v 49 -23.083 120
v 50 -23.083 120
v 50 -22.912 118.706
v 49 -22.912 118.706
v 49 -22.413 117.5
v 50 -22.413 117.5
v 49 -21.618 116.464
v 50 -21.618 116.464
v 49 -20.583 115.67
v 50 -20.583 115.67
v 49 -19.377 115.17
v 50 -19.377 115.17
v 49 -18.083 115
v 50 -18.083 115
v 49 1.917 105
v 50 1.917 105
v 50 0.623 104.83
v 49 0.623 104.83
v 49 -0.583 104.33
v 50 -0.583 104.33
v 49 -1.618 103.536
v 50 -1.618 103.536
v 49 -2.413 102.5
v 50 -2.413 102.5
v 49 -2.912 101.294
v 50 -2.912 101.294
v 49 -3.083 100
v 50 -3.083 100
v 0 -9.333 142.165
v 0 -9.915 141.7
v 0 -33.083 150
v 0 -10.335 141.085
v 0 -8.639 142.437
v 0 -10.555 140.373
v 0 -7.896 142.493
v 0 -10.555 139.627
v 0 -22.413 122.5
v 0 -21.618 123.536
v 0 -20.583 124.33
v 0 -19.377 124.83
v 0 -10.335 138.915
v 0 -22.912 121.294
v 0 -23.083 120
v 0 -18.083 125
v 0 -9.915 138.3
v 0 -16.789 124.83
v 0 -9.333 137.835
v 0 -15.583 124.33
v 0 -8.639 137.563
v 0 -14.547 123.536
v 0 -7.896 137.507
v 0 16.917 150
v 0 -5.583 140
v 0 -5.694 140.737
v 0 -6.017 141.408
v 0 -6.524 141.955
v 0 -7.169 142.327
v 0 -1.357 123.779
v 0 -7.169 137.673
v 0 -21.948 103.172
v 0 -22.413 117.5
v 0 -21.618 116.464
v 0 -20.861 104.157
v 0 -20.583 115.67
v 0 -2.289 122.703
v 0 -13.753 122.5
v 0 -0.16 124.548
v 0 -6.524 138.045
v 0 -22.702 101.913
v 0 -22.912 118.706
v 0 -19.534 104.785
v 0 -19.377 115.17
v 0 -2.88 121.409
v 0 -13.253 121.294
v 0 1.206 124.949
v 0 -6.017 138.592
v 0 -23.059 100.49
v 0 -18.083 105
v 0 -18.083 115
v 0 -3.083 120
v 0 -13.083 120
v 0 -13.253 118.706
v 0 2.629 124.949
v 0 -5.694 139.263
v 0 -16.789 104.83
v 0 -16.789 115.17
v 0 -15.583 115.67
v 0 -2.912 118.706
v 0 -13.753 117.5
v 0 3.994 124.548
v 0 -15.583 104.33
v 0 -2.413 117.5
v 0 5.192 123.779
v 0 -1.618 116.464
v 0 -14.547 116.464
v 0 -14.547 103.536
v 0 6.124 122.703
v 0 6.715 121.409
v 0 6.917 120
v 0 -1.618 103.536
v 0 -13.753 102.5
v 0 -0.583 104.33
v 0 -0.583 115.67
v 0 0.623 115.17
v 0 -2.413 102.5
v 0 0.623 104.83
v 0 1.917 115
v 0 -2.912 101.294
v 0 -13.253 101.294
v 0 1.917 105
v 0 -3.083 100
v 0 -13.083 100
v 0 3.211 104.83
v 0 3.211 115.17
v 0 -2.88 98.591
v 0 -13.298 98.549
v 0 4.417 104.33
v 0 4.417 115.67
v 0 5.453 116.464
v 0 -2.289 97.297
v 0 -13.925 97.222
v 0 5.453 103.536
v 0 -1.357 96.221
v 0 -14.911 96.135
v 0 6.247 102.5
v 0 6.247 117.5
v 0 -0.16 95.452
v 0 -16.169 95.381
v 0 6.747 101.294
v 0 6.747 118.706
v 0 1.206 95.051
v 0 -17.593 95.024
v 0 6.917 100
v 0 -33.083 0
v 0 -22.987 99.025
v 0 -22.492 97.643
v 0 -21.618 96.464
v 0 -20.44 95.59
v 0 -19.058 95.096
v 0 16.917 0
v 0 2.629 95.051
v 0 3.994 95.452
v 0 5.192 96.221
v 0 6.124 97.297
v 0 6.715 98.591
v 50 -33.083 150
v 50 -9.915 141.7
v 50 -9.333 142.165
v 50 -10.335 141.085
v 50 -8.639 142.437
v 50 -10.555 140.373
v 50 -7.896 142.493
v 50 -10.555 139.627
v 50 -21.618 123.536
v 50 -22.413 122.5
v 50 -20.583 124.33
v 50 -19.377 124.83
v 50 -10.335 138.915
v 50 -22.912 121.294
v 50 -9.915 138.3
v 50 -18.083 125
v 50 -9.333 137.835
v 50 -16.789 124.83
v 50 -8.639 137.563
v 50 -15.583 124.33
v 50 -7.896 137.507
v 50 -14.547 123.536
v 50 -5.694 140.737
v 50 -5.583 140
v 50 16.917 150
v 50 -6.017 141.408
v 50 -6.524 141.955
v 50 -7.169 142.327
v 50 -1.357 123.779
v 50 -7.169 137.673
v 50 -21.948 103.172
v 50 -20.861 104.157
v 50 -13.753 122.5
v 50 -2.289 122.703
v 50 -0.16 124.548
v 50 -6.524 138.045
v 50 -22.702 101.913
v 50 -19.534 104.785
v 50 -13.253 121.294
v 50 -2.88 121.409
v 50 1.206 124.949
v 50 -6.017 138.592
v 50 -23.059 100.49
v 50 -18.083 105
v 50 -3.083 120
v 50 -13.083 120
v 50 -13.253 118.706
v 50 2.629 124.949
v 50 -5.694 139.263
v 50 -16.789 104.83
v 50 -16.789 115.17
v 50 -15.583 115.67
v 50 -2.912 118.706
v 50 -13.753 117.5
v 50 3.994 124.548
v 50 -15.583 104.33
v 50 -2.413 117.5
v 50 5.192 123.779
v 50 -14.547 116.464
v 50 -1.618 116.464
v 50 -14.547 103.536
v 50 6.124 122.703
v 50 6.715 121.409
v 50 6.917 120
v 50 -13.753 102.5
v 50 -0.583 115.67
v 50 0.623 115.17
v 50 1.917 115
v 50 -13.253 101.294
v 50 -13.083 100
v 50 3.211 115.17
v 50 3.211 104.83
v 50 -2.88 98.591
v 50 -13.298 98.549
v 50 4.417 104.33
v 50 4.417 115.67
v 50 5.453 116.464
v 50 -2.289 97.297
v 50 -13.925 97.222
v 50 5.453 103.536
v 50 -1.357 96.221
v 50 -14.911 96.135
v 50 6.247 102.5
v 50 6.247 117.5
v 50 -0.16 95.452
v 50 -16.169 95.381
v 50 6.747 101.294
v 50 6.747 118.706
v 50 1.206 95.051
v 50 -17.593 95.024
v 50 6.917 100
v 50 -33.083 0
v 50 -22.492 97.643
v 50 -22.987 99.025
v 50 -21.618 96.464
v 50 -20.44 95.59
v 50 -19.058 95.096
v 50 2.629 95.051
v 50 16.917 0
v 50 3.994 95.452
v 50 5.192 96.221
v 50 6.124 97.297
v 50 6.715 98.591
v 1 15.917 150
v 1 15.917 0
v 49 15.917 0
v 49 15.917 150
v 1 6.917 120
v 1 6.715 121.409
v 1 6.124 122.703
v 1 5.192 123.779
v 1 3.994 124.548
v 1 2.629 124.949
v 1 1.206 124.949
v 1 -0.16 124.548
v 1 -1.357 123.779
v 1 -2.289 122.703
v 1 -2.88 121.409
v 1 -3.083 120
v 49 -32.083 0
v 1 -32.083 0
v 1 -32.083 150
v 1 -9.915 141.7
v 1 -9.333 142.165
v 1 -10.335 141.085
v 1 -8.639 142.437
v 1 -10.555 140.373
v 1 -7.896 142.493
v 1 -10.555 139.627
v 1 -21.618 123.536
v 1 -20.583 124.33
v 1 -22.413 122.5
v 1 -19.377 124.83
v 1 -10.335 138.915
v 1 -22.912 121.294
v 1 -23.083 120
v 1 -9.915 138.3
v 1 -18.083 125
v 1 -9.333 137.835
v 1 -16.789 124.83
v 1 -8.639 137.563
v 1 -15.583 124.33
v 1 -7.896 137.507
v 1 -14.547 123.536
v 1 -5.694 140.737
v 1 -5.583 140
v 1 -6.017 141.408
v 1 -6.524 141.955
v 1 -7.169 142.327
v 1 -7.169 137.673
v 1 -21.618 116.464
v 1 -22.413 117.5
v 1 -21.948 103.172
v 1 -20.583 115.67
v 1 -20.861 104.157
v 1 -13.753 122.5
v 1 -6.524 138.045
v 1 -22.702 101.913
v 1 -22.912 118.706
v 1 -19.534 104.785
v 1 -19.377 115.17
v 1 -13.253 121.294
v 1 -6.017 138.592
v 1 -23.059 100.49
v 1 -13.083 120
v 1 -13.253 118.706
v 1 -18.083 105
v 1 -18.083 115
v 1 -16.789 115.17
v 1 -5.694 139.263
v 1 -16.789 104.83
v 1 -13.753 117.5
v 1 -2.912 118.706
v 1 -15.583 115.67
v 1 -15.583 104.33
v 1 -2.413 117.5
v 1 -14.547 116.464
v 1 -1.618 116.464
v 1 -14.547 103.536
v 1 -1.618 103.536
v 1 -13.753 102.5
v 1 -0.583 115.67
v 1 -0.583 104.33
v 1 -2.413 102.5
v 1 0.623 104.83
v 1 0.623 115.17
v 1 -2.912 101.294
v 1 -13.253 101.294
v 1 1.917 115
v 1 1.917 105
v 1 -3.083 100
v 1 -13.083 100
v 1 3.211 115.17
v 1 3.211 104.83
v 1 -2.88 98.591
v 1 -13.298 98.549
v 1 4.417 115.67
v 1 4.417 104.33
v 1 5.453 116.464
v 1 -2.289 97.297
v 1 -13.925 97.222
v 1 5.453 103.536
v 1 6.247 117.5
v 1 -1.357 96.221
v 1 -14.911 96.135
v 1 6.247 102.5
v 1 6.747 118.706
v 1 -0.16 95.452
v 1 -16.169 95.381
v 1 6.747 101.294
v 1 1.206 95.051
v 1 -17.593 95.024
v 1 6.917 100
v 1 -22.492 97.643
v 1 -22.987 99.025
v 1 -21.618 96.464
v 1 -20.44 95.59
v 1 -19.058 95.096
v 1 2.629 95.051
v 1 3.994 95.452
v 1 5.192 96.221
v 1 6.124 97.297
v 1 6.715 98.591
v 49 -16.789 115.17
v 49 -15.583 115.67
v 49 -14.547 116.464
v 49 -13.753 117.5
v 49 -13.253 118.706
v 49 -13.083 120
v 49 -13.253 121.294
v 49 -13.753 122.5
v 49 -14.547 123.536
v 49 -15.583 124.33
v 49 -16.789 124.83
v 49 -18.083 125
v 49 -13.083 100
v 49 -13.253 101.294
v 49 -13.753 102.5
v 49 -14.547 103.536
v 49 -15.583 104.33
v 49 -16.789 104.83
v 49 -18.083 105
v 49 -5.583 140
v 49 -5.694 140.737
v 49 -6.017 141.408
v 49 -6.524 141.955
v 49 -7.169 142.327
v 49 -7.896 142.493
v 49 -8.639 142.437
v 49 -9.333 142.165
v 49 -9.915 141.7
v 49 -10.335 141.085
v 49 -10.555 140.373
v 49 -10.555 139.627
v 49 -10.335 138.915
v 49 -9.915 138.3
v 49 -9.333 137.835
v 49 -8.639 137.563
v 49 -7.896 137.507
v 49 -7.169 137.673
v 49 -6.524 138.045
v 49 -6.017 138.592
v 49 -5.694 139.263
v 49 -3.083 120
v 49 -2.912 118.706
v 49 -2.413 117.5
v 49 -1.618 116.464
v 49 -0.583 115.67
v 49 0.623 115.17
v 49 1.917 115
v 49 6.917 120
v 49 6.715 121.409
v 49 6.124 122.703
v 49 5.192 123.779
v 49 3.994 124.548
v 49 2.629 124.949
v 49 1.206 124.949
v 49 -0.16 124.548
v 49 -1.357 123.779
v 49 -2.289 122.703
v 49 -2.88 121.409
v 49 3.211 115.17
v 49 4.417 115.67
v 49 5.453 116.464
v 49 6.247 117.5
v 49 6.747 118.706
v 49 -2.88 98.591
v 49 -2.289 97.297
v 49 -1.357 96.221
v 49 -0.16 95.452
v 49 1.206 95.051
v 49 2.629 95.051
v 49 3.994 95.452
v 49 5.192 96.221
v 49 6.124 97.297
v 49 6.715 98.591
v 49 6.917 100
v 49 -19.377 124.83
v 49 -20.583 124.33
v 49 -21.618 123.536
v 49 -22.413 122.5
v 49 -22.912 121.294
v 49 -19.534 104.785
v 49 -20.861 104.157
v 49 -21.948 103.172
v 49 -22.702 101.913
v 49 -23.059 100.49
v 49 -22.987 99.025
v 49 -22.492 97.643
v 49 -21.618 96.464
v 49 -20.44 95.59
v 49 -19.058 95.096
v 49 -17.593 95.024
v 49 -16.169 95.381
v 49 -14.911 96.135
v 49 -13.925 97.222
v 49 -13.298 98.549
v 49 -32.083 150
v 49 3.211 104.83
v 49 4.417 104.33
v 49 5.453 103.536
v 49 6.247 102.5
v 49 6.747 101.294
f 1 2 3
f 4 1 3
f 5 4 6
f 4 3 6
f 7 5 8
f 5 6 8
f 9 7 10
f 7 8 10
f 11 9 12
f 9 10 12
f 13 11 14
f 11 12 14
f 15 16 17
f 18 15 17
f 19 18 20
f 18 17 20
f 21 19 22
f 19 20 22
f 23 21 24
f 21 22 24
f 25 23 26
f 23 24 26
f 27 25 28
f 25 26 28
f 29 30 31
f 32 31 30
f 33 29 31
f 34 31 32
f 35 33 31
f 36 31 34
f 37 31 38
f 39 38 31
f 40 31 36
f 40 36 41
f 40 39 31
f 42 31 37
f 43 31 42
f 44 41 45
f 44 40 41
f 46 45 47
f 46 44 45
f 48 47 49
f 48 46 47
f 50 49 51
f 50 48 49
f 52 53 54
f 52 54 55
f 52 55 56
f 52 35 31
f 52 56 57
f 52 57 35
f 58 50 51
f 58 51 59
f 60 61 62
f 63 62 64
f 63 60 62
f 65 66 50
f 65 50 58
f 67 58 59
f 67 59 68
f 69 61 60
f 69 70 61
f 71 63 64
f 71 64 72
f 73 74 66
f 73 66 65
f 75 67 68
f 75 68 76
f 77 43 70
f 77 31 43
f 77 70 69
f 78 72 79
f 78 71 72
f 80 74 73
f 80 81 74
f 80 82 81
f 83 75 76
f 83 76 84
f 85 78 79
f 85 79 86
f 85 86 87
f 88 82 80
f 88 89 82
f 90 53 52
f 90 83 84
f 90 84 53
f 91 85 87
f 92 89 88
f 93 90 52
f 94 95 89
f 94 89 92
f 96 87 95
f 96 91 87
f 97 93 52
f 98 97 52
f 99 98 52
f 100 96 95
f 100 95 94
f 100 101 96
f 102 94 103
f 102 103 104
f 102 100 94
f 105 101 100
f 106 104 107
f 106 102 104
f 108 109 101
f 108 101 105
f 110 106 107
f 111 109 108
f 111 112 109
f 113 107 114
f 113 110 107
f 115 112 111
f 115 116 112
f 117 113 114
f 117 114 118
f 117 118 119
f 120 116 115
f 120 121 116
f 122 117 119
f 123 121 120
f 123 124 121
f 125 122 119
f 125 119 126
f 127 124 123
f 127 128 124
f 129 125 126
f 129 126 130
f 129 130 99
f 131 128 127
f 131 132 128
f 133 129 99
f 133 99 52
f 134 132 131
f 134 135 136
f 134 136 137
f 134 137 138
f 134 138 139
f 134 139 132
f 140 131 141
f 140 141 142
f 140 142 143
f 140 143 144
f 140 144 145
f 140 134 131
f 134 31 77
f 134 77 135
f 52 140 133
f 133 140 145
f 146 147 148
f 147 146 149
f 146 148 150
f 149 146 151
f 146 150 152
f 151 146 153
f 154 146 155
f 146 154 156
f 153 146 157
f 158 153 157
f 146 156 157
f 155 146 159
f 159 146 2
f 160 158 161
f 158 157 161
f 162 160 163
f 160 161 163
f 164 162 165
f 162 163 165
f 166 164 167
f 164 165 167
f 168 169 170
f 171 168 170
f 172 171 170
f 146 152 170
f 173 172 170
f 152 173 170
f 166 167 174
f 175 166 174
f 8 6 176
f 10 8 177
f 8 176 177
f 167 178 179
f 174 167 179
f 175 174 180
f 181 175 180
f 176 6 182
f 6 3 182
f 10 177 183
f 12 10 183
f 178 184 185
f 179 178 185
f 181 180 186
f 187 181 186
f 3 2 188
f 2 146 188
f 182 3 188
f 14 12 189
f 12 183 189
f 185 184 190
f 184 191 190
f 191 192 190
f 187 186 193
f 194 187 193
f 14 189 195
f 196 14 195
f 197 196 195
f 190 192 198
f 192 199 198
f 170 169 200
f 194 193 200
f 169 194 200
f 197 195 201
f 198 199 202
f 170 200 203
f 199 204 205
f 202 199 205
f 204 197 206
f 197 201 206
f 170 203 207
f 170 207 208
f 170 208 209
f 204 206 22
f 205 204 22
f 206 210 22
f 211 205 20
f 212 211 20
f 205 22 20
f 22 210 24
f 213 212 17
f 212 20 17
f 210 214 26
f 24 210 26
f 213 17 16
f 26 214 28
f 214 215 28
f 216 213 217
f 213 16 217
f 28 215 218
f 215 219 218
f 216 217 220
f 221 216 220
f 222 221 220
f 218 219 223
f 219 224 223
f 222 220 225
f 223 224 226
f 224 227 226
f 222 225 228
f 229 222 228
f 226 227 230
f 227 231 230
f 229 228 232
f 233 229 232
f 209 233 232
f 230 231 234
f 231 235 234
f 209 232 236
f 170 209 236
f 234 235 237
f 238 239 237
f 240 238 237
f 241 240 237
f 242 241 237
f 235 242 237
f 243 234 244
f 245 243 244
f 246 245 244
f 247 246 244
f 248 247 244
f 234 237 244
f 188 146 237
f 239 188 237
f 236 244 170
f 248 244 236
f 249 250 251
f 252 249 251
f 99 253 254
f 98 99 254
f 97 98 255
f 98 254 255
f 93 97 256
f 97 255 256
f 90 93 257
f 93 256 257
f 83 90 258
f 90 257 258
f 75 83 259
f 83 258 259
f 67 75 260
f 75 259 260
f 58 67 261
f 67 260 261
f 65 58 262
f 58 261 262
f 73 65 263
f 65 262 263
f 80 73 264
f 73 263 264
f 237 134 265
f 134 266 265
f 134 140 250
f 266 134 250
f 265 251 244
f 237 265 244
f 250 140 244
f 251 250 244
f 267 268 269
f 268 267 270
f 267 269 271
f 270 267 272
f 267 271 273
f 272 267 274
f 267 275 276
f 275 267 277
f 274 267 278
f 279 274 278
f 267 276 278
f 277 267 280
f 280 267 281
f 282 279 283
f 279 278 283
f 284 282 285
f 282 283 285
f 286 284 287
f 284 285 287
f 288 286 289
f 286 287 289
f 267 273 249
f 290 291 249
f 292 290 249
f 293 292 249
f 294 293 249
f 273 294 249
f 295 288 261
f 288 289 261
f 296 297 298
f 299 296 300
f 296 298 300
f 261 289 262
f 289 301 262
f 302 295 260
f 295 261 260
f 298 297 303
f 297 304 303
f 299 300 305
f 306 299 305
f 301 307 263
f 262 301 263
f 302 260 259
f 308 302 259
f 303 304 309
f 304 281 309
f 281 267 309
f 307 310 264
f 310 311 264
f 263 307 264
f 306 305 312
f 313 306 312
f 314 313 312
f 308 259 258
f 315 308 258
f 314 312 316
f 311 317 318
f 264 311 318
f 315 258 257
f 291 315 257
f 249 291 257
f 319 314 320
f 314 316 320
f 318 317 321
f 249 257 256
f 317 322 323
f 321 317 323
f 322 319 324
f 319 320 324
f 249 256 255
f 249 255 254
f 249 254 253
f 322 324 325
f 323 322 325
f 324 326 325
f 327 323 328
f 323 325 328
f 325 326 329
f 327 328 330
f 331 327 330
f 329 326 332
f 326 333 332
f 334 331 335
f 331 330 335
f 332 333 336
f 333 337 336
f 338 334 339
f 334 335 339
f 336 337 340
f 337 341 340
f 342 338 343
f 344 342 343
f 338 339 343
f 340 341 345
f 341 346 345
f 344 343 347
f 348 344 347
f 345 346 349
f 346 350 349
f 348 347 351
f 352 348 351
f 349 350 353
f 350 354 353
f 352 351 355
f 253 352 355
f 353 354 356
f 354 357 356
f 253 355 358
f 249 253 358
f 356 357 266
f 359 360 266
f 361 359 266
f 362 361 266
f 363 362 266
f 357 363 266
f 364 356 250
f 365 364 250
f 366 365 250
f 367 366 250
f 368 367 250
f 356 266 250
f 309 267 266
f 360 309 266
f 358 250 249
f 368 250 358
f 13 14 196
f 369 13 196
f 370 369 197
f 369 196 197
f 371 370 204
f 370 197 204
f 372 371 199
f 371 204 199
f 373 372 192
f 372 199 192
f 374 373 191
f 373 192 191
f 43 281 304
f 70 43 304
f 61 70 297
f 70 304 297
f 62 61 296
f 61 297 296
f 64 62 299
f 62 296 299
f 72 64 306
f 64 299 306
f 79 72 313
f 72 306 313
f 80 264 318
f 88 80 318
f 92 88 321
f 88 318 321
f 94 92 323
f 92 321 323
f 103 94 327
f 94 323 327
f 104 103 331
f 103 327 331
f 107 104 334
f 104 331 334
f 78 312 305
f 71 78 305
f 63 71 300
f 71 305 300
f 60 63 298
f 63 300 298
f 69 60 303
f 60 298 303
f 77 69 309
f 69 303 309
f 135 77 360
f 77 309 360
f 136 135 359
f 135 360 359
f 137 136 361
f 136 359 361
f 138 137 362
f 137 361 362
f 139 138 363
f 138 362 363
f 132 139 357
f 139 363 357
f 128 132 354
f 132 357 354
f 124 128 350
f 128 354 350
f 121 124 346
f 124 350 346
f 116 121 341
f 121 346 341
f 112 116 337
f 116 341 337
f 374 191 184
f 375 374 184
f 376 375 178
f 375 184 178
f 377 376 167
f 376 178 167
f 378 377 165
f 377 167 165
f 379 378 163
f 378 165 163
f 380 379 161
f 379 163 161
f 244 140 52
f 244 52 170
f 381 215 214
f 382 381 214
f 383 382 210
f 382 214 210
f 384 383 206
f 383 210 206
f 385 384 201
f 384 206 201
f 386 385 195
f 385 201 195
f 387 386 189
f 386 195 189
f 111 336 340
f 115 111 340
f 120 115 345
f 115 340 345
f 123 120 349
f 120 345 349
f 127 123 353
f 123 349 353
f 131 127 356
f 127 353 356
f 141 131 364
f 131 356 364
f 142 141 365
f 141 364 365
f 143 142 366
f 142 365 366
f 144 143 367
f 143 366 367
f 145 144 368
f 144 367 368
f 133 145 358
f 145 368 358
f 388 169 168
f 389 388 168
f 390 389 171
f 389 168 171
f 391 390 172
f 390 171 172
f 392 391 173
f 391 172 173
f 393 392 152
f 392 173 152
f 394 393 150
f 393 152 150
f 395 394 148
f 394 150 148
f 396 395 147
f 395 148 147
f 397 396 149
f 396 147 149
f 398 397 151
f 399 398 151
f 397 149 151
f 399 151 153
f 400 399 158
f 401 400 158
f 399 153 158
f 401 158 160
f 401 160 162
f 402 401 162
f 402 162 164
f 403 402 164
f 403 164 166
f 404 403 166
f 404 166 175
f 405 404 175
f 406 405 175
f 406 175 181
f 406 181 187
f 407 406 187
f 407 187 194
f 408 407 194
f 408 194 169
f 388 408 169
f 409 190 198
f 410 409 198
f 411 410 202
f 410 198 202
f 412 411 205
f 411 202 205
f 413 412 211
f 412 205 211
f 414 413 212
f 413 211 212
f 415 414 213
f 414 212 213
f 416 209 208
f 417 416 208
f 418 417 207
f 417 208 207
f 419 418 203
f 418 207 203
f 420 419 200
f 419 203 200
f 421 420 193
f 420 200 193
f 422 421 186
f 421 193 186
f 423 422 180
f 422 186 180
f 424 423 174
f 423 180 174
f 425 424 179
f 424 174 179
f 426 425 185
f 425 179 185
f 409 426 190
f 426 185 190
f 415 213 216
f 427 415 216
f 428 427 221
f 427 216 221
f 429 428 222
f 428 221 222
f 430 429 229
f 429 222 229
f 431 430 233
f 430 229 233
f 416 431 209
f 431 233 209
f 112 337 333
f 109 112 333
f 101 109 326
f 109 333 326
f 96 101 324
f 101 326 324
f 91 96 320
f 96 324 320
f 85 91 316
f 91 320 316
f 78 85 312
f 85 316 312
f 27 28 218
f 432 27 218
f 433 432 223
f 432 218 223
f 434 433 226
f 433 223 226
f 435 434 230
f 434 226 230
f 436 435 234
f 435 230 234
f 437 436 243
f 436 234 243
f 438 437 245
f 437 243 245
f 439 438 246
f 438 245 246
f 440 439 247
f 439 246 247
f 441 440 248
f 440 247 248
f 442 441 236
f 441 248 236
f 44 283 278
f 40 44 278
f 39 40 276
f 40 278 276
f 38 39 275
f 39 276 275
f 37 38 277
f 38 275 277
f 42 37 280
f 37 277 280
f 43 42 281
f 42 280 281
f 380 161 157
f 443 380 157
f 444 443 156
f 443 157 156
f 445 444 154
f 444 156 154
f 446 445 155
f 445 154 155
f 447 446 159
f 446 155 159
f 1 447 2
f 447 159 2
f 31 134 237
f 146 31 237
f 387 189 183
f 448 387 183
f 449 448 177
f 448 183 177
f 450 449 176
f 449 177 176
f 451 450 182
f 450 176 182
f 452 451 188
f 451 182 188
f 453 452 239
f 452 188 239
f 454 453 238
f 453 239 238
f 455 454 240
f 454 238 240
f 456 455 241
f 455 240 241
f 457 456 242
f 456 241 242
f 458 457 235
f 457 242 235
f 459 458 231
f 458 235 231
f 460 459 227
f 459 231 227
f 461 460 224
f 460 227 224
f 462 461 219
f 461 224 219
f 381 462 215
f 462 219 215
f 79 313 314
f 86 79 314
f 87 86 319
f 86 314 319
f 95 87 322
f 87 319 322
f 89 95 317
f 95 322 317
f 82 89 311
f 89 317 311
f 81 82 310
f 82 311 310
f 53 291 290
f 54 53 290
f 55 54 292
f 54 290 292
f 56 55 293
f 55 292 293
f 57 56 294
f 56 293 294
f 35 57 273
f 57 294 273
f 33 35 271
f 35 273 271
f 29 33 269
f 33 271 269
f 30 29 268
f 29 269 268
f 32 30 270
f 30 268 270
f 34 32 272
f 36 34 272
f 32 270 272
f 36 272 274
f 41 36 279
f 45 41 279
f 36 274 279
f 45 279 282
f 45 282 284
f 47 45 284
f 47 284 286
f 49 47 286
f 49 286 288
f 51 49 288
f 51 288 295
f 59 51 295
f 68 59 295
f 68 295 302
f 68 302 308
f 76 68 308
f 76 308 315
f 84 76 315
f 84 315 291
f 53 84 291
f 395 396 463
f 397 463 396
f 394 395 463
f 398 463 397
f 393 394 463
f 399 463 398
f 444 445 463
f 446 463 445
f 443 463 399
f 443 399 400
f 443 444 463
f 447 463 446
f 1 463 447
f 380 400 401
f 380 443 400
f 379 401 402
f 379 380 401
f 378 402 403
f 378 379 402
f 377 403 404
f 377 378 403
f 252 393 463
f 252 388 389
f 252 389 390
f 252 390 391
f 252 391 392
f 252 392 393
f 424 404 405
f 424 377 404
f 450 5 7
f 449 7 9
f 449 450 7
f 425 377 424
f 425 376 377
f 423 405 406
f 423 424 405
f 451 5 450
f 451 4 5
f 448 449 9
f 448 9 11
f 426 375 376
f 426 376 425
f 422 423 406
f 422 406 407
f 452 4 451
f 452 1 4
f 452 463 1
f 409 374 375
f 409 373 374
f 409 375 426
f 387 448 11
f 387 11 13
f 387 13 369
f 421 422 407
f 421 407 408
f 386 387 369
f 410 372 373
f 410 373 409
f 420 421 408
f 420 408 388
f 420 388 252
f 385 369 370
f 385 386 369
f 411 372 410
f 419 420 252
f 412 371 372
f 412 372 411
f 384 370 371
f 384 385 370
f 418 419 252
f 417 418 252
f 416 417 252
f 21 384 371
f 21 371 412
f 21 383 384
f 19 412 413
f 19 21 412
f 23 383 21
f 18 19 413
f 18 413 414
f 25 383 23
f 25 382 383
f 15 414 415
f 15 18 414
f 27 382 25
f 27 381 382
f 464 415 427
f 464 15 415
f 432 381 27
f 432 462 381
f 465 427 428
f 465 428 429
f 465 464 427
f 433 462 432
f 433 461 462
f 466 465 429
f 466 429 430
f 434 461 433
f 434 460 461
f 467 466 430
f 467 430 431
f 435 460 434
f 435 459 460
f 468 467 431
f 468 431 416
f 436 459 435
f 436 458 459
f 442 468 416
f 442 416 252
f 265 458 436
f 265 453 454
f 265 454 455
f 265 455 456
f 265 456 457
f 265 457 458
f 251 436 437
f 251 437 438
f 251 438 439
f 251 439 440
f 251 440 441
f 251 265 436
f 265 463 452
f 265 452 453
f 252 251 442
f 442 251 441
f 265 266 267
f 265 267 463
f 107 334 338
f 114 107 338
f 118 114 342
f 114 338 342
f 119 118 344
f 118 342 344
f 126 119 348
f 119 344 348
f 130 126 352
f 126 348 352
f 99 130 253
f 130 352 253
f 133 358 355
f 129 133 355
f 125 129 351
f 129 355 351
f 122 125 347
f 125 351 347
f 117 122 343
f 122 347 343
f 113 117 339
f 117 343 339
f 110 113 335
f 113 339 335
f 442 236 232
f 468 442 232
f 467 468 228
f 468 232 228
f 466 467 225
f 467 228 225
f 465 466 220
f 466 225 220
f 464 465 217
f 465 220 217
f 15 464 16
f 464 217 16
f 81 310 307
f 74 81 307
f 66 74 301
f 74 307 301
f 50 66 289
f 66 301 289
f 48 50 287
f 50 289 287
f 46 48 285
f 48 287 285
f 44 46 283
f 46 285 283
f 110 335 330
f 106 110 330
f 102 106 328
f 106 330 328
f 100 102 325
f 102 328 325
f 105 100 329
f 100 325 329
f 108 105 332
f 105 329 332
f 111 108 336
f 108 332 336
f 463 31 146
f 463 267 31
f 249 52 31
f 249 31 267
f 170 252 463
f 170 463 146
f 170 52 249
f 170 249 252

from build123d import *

# Parameters (mm, degrees)
F0_W     = 50
F0_H     = 50
F0_W_2   = 48
F0_H_2   = 48
F1_DEPTH = 150
F2_R     = 2.5
F3_DEPTH = 50


with BuildPart() as f1:
    # F0 (on Top) → F1 (new body)
    with BuildSketch(Plane.XY):
        with Locations((25, -8.0827108582)):
            Rectangle(F0_W, F0_H)
        with Locations((25, -8.0827108582)):
            Rectangle(F0_W_2, F0_H_2, mode=Mode.SUBTRACT)
    extrude(amount=F1_DEPTH)

    # F2 (on face) → F3 (cut)
    with BuildSketch(Plane.YZ.offset(50)):
        with Locations((-8.0827108582, 140)):
            Circle(F2_R)
        with BuildLine():
            Line((1.9172891418, 120), (-3.0827108582, 120))
            ThreePointArc((-3.0827108582, 120), (-1.6182447641, 116.4644660941), (1.9172891418, 115))
            Line((1.9172891418, 115), (1.9172891418, 120))
        make_face()
        with BuildLine():
            ThreePointArc((6.9172891418, 120), (1.9172891418, 125), (-3.0827108582, 120))
            Line((-3.0827108582, 120), (1.9172891418, 120))
            Line((1.9172891418, 120), (1.9172891418, 115))
            ThreePointArc((1.9172891418, 115), (5.4528230478, 116.4644660941), (6.9172891418, 120))
        make_face()
        with BuildLine():
            ThreePointArc((-13.0827108582, 100), (-14.5471769522, 103.5355339059), (-18.0827108582, 105))
            Line((-18.0827108582, 105), (-18.0827108582, 100))
            Line((-18.0827108582, 100), (-13.0827108582, 100))
        make_face()
        with BuildLine():
            Line((-18.0827108582, 100), (-18.0827108582, 105))
            ThreePointArc((-18.0827108582, 105), (-21.6182447641, 96.4644660941), (-13.0827108582, 100))
            Line((-13.0827108582, 100), (-18.0827108582, 100))
        make_face()
        with BuildLine():
            Line((1.9172891418, 100), (1.9172891418, 105))
            ThreePointArc((1.9172891418, 105), (-1.6182447641, 103.5355339059), (-3.0827108582, 100))
            Line((-3.0827108582, 100), (1.9172891418, 100))
        make_face()
        with BuildLine():
            ThreePointArc((6.9172891418, 100), (5.4528230478, 103.5355339059), (1.9172891418, 105))
            Line((1.9172891418, 105), (1.9172891418, 100))
            Line((1.9172891418, 100), (-3.0827108582, 100))
            ThreePointArc((-3.0827108582, 100), (1.9172891418, 95), (6.9172891418, 100))
        make_face()
        with BuildLine():
            Line((-18.0827108582, 120), (-18.0827108582, 125))
            ThreePointArc((-18.0827108582, 125), (-21.6182447641, 123.5355339059), (-23.0827108582, 120))
            Line((-23.0827108582, 120), (-18.0827108582, 120))
        make_face()
        with BuildLine():
            Line((-18.0827108582, 120), (-23.0827108582, 120))
            ThreePointArc((-23.0827108582, 120), (-21.6182447641, 116.4644660941), (-18.0827108582, 115))
            Line((-18.0827108582, 115), (-18.0827108582, 120))
        make_face()
        with BuildLine():
            ThreePointArc((-13.0827108582, 120), (-14.5471769522, 123.5355339059), (-18.0827108582, 125))
            Line((-18.0827108582, 125), (-18.0827108582, 120))
            Line((-18.0827108582, 120), (-13.0827108582, 120))
        make_face()
        with BuildLine():
            Line((-13.0827108582, 120), (-18.0827108582, 120))
            Line((-18.0827108582, 120), (-18.0827108582, 115))
            ThreePointArc((-18.0827108582, 115), (-14.5471769522, 116.4644660941), (-13.0827108582, 120))
        make_face()
    extrude(amount=-F3_DEPTH, mode=Mode.SUBTRACT)


solid = f1.part
